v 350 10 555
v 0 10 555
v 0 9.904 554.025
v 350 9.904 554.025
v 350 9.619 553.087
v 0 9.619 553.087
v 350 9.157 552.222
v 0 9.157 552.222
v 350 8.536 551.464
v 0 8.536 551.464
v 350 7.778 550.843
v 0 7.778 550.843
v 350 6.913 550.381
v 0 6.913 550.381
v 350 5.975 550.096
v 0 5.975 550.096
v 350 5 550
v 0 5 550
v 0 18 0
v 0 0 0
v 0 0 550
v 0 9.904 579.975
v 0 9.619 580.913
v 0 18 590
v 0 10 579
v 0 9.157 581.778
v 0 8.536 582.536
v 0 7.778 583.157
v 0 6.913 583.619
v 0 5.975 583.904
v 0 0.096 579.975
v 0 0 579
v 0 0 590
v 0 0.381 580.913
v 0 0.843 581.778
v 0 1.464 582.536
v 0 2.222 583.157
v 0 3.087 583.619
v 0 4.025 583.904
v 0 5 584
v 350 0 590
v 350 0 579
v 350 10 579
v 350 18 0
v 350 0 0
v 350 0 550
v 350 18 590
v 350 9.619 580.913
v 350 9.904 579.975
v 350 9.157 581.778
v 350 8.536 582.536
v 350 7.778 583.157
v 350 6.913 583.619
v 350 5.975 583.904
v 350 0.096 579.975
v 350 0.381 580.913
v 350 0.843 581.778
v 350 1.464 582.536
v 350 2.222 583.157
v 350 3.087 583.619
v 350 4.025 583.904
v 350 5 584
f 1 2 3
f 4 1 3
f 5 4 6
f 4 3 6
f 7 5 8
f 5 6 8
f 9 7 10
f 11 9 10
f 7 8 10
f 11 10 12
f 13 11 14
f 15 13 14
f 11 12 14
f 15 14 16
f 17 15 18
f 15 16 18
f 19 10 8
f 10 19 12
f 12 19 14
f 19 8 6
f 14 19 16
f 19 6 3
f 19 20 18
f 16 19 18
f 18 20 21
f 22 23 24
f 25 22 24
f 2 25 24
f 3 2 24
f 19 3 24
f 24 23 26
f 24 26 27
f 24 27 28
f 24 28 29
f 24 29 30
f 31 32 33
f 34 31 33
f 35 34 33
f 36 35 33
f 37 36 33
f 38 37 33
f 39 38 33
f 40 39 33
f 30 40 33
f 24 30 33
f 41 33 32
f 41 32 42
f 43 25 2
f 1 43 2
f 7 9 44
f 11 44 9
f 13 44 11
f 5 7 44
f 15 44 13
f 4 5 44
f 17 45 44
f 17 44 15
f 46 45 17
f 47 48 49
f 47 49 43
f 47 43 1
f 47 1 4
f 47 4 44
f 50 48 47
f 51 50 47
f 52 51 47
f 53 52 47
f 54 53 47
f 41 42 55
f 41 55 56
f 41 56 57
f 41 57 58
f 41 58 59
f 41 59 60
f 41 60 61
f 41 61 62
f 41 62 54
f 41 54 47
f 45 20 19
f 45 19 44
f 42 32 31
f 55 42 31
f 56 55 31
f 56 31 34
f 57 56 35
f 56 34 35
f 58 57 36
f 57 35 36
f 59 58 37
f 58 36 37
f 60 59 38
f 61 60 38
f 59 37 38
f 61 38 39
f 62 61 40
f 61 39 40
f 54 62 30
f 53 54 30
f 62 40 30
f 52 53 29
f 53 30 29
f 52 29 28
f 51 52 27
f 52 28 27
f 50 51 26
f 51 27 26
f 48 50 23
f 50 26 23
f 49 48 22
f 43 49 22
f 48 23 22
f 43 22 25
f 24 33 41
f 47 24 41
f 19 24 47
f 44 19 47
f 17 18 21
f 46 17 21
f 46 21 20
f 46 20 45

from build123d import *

# Parameters (mm, degrees)
F0_W     = 350
F0_H     = 590
F1_DEPTH = 18
F3_DEPTH = 452


with BuildPart() as f1:
    # F0 (on Front) → F1 (new body)
    with BuildSketch(Plane.XZ):
        with Locations((175, 295)):
            Rectangle(F0_W, F0_H)
    extrude(amount=-F1_DEPTH)

    # F2 (on face) → F3 (cut)
    with BuildSketch(Plane(origin=(0, 0, 0), x_dir=(0, -1, 0), z_dir=(-1, 0, 0))):
        with BuildLine():
            Line((-5, 550), (0, 550))
            Line((0, 550), (0, 579))
            ThreePointArc((0, 579), (-5, 584), (-10, 579))
            Line((-10, 579), (-10, 555))
            ThreePointArc((-10, 555), (-8.535534, 551.464466), (-5, 550))
        make_face()
    extrude(amount=-F3_DEPTH, mode=Mode.SUBTRACT)


solid = f1.part
